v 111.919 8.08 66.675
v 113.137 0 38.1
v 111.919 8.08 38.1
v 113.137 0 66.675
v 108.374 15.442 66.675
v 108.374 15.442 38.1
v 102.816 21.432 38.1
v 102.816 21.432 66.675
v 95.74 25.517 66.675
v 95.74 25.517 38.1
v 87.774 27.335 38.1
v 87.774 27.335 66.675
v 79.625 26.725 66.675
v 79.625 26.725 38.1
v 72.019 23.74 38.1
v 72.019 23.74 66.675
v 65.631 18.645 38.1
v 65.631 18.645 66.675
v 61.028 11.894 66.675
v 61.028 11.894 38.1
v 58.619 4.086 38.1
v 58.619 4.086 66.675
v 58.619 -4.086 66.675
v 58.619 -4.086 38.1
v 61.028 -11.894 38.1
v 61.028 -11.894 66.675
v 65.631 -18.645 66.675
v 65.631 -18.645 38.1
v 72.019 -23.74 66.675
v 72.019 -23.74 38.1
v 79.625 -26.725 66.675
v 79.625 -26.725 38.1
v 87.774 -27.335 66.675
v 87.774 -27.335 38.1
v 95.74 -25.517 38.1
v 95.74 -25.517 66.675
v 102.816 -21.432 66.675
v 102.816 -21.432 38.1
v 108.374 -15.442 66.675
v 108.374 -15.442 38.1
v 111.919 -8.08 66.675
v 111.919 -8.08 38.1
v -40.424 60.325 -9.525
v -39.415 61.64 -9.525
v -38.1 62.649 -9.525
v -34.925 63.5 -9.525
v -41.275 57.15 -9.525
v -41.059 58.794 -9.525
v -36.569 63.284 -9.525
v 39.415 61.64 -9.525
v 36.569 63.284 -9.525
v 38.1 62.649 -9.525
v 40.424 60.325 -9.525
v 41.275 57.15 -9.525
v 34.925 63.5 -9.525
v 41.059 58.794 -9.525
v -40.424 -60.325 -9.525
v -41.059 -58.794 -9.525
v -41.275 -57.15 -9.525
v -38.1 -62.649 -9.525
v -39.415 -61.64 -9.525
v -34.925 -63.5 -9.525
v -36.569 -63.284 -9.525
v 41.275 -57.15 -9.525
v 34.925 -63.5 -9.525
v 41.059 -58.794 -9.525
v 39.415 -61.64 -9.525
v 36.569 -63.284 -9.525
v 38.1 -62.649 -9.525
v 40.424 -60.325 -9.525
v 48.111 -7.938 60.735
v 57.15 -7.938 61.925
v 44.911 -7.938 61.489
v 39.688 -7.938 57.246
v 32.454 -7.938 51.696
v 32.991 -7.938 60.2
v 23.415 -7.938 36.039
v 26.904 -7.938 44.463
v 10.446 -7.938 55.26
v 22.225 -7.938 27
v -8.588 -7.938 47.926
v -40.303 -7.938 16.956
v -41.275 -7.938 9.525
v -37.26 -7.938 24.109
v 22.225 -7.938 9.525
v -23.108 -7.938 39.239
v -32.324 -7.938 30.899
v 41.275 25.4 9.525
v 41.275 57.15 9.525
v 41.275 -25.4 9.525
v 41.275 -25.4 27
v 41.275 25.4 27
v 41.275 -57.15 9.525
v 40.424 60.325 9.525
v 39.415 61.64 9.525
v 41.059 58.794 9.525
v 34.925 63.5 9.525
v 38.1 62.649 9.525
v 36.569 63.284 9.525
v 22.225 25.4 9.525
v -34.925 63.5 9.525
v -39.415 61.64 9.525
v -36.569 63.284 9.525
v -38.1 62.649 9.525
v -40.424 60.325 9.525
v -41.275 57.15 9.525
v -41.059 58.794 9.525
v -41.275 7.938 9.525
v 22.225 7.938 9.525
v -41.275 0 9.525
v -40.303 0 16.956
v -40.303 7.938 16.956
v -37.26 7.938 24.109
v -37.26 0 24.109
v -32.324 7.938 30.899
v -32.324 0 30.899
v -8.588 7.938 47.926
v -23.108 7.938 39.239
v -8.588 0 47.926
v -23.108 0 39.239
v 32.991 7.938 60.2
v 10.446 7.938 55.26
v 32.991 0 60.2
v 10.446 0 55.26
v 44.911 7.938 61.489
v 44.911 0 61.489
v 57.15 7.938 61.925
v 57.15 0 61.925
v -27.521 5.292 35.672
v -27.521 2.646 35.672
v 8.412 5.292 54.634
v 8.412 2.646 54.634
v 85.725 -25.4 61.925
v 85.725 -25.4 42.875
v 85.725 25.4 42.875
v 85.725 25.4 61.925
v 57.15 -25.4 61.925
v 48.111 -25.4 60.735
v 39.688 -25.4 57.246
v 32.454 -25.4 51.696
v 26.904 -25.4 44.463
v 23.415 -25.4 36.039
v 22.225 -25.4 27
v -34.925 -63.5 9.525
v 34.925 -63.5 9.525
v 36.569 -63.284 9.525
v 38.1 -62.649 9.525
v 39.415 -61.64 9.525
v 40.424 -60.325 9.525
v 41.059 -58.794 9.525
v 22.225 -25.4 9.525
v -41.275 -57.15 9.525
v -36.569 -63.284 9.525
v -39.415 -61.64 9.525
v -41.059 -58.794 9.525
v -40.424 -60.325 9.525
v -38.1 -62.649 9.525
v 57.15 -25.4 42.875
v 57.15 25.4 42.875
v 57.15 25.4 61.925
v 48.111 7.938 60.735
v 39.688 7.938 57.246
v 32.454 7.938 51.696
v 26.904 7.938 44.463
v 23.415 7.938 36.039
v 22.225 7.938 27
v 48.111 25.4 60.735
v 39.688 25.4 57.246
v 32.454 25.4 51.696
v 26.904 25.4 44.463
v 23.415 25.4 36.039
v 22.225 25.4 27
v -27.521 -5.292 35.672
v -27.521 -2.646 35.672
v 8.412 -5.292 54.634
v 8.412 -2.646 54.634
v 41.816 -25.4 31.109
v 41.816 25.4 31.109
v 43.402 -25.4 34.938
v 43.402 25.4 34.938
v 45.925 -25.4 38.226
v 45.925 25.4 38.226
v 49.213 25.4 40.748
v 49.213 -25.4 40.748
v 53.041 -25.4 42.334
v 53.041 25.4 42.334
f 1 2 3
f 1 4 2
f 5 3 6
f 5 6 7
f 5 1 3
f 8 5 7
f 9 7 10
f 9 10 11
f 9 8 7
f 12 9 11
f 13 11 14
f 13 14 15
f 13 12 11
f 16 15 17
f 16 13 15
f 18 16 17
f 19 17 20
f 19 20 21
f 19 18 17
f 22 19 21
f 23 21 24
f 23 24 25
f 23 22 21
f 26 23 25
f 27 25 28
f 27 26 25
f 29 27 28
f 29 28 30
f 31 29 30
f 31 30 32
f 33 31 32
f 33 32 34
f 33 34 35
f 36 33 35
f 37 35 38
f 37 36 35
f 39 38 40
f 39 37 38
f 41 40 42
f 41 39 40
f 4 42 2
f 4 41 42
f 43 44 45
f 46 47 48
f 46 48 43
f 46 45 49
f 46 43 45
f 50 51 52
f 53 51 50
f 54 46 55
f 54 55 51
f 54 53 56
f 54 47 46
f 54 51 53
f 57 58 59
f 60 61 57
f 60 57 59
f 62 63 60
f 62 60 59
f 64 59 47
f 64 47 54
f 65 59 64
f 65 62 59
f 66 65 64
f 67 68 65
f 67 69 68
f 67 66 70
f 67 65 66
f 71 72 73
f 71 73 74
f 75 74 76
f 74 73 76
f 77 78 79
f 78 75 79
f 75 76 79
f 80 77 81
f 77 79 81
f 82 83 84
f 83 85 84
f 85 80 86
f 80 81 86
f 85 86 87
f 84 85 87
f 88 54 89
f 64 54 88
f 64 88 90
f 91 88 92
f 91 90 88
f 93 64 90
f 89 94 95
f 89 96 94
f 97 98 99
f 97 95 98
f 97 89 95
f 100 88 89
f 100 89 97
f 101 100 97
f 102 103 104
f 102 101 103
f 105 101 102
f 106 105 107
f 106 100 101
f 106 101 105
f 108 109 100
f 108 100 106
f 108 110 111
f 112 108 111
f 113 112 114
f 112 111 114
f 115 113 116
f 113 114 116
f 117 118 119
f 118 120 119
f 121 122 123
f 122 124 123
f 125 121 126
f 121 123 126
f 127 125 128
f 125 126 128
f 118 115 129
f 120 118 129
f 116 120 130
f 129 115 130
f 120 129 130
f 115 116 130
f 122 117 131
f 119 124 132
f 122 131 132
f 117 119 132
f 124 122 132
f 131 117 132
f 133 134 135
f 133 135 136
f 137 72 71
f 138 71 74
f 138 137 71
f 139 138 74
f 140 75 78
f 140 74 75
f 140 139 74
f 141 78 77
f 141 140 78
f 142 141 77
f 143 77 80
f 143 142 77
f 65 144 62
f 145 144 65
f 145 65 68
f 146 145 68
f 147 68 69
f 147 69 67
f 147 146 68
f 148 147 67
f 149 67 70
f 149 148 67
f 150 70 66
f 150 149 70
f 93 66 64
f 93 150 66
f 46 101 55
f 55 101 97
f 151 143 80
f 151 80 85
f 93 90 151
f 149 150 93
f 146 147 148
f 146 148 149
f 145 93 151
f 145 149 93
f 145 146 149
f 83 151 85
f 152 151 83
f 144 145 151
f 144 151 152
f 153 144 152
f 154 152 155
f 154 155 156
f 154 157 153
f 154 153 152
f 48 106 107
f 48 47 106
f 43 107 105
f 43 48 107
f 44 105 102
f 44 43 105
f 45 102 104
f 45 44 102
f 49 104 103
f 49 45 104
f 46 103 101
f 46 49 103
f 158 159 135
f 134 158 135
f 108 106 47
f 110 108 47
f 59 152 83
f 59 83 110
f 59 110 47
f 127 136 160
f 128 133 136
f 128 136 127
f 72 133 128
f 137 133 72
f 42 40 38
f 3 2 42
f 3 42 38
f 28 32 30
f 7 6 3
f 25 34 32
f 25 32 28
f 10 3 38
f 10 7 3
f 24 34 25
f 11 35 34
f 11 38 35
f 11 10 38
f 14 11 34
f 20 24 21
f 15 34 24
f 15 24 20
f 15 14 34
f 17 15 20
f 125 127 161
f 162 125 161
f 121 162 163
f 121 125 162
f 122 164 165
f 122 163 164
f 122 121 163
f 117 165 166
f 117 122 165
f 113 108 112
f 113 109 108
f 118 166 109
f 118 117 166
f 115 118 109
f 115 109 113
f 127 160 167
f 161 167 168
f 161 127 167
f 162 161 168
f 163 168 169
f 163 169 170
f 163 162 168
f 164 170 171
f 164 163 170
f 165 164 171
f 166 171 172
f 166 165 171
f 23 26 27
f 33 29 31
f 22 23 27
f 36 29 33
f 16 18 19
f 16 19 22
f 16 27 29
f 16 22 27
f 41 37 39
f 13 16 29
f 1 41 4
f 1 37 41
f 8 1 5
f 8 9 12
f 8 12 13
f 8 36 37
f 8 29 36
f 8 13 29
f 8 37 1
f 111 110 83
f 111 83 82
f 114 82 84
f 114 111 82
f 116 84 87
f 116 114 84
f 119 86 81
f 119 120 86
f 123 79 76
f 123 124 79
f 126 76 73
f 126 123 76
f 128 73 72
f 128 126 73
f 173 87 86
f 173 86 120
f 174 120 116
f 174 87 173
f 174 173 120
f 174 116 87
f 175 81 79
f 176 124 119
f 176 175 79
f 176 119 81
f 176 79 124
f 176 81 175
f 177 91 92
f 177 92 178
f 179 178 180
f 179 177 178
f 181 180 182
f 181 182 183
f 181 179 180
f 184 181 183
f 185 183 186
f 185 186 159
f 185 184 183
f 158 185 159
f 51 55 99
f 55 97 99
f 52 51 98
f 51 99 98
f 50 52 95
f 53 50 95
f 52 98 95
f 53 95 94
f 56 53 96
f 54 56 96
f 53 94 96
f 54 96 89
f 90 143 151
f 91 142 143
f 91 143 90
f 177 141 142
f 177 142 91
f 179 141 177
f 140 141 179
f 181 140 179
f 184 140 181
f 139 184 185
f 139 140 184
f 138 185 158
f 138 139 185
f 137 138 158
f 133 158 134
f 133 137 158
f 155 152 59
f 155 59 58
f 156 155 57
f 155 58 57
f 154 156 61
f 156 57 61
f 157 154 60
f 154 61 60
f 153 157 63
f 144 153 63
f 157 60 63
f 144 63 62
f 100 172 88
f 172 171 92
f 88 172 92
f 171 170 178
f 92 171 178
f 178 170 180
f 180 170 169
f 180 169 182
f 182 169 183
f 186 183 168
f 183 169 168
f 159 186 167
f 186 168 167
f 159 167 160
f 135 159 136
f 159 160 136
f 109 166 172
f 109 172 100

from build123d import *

# Parameters (mm, degrees)
F1_DEPTH = 63.5
F0_W     = 23.3879331585
F0_H     = 19.05
F2_DEPTH = 25.4
F3_DEPTH = 7.9375
F5_R     = 6.35


with BuildPart() as f1:
    # F0 (on Front) → F1 (new body, symmetric)
    with BuildSketch(Plane.XZ):
        Polygon((22.225, 9.525), (-41.275, 9.525), (-41.275, -9.525), (41.275, -9.525), (41.275, 9.525), align=None)
    extrude(amount=F1_DEPTH, both=True)

    # F0 (on Front) → F2 (join, symmetric)
    with BuildSketch(Plane.XZ):
        with BuildLine():
            Line((22.225, 27.0002), (22.225, 9.525))
            Line((22.225, 9.525), (41.275, 9.525))
            Line((41.275, 9.525), (41.275, 27.0002))
            ThreePointArc((41.275, 27.0002), (45.9246798487, 38.2255201513), (57.15, 42.8752))
            Line((57.15, 42.8752), (62.3370668415, 42.8752))
            Line((62.3370668415, 42.8752), (62.3370668415, 61.9252))
            Line((62.3370668415, 61.9252), (57.15, 61.9252))
            ThreePointArc((57.15, 61.9252), (32.4542956671, 51.6959043329), (22.225, 27.0002))
        make_face()
        with Locations((74.0310334207, 52.4002)):
            Rectangle(F0_W, F0_H)
    extrude(amount=F2_DEPTH, both=True)

    # F0 (on Front) → F3 (join, symmetric)
    with BuildSketch(Plane.XZ):
        with BuildLine():
            add(Edge.make_bspline(
                [(-41.275, 9.525), (-41.7356142866, 37.7689963041), (5.1350374706, 61.9642660022), (57.15, 61.9252)],
                knots=[0, 0, 0, 0, 111.5045361635, 111.5045361635, 111.5045361635, 111.5045361635], degree=3))
            Line((-41.275, 9.525), (22.225, 9.525))
            Line((22.225, 9.525), (22.225, 27.0002))
            ThreePointArc((22.225, 27.0002), (32.4542956671, 51.6959043329), (57.15, 61.9252))
        make_face()
    extrude(amount=F3_DEPTH, both=True)

    # F5
    f5_edges = [f1.edges().sort_by_distance(p)[0] for p in [
        (41.275, -63.5, 0),
        (41.275, 63.5, 0),
        (-41.275, 63.5, 0),
        (-41.275, -63.5, 0),
    ]]
    fillet(f5_edges, radius=F5_R)


with BuildPart() as f4:
    # F0 (on Front) → F4 (revolve)
    with BuildSketch(Plane.XZ):
        Polygon((85.725, 66.675), (85.725, 61.9252), (85.725, 42.8752), (85.725, 38.1), (113.1370668415, 38.1), (113.1370668415, 66.675), align=None)
    revolve(axis=Axis((85.725, 0, 52.3875), (0, 0, 1)))


solid = Compound([f1.part, f4.part])
